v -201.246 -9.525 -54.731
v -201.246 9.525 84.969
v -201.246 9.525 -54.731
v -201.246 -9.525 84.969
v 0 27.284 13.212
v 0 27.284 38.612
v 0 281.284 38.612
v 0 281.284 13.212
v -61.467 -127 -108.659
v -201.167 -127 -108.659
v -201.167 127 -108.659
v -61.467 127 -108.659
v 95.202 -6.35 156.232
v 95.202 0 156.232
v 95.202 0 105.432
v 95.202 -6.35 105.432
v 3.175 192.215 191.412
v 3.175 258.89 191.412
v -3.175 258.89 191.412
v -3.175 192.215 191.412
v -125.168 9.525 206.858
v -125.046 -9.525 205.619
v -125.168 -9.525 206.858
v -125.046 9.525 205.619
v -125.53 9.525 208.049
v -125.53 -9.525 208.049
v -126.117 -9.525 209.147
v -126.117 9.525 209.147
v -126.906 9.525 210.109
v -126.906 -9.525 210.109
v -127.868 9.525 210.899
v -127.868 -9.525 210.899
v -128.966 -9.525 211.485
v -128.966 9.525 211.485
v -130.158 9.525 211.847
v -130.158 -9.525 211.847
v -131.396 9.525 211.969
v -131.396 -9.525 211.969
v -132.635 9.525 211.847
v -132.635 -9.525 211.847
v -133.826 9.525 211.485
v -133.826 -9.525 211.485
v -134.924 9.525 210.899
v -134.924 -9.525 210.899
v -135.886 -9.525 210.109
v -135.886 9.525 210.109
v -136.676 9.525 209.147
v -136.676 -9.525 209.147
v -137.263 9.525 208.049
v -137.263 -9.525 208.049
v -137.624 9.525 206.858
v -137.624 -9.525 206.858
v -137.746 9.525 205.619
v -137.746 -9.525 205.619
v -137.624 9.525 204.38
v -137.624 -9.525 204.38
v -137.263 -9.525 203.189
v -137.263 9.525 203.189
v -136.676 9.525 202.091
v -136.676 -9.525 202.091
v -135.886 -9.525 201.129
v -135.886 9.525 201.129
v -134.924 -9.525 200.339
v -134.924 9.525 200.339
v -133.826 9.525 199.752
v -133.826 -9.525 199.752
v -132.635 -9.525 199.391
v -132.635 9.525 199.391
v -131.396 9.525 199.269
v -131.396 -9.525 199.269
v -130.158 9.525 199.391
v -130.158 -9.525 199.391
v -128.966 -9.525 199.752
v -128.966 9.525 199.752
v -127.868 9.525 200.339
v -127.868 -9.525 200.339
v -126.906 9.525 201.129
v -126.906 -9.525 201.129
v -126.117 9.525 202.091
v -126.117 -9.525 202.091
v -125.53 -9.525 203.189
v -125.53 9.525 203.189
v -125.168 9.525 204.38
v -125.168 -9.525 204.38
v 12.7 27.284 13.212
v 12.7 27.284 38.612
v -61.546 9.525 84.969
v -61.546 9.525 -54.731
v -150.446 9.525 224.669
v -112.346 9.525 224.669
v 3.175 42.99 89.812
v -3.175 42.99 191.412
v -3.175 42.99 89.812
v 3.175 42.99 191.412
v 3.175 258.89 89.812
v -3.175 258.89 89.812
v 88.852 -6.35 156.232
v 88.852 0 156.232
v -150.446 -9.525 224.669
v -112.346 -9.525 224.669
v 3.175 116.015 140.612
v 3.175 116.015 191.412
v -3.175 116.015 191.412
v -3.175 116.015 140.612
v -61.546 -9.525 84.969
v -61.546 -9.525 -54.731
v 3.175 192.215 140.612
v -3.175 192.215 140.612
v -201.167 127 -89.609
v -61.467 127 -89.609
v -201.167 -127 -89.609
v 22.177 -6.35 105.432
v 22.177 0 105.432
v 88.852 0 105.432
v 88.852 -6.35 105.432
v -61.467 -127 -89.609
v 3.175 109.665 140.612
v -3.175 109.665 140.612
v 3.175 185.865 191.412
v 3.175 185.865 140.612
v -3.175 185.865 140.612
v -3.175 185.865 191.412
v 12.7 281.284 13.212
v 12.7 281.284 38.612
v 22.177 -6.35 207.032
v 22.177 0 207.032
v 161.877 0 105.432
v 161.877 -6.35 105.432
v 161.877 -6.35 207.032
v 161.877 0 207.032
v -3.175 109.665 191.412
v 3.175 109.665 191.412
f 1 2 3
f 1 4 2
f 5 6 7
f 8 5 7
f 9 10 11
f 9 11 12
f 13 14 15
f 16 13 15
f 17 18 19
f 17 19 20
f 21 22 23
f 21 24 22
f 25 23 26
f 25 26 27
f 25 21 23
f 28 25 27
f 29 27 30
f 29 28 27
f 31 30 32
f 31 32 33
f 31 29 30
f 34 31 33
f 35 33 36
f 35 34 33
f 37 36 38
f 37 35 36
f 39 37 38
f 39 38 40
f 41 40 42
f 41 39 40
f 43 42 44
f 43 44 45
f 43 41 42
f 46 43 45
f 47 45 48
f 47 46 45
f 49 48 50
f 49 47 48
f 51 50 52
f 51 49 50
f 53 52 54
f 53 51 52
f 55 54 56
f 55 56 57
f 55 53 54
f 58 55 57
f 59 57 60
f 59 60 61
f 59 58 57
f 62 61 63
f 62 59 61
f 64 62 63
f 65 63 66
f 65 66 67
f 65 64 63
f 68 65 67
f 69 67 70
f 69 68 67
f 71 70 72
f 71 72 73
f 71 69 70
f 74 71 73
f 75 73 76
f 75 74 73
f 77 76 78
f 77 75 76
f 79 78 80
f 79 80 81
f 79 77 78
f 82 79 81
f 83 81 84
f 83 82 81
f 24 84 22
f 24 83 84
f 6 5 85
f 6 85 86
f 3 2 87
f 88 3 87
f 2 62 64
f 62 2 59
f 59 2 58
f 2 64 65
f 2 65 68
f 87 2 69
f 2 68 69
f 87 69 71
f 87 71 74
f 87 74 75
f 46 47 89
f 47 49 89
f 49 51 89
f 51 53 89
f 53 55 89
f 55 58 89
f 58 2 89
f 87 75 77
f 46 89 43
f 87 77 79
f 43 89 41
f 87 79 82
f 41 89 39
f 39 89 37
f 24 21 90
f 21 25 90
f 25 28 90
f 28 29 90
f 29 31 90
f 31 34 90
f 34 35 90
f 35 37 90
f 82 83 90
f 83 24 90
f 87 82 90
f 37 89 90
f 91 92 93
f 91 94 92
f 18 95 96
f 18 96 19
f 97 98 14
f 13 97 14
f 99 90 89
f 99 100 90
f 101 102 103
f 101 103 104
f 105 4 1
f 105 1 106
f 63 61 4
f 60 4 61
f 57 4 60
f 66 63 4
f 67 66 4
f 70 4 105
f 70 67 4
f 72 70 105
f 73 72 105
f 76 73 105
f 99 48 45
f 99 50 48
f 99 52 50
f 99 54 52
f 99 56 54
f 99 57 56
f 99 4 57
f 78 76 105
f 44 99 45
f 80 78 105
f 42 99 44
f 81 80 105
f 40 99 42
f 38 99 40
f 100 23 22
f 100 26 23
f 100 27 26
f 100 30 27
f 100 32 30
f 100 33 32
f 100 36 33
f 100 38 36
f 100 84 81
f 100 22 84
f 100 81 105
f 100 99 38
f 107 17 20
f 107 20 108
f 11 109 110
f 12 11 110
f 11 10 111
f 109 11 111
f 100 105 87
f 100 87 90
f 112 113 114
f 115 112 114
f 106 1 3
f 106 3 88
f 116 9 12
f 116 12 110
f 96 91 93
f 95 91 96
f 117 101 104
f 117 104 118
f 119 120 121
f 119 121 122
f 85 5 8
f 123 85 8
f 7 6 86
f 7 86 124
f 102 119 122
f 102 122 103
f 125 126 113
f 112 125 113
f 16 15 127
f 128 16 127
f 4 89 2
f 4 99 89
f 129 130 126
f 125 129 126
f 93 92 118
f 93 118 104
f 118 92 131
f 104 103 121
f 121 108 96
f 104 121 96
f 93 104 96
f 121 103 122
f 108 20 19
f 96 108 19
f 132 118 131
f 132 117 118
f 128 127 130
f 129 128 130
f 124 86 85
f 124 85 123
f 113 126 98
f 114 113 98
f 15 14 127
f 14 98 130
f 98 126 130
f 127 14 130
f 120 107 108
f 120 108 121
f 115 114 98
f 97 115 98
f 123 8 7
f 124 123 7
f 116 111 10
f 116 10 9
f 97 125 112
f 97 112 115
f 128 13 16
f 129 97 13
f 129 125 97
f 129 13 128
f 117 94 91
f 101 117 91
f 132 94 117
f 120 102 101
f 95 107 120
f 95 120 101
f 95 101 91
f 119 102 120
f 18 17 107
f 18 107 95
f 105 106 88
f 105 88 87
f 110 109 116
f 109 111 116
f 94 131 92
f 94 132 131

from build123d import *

# Parameters (mm, degrees)
F2_W     = 254
F2_H     = 25.4
F3_DEPTH = 12.7
F1_R     = 6.35
F4_DEPTH = 9.525
F0_W     = 139.7
F0_H     = 19.05
F5_DEPTH = 127
F7_DEPTH = 3.175
F9_DEPTH = 6.35


with BuildPart() as f3:
    # F2 (on Right) → F3 (new body)
    with BuildSketch(Plane.YZ):
        with Locations((154.283948, 25.912475)):
            Rectangle(F2_W, F2_H)
    extrude(amount=F3_DEPTH)


with BuildPart() as f4:
    # F1 (on Front) → F4 (new body, symmetric)
    with BuildSketch(Plane.XZ):
        Polygon((-201.246336, 84.968814), (-201.246336, -54.731186), (-61.546336, -54.731186), (-61.546336, 84.968814), (-112.346336, 224.668814), (-150.446336, 224.668814), align=None)
        with Locations((-131.396336, 205.618814)):
            Circle(F1_R, mode=Mode.SUBTRACT)
    extrude(amount=F4_DEPTH, both=True)


with BuildPart() as f5:
    # F0 (on Front) → F5 (new body, symmetric)
    with BuildSketch(Plane.XZ):
        with Locations((-131.317047, -99.13432)):
            Rectangle(F0_W, F0_H)
    extrude(amount=F5_DEPTH, both=True)


with BuildPart() as f7:
    # F6 (on Right) → F7 (new body, symmetric)
    with BuildSketch(Plane.YZ):
        Polygon((42.990074, 191.412407), (42.990074, 89.812407), (258.890074, 89.812407), (258.890074, 191.412407), (192.215074, 191.412407), (192.215074, 140.612407), (185.865074, 140.612407), (185.865074, 191.412407), (116.015074, 191.412407), (116.015074, 140.612407), (109.665074, 140.612407), (109.665074, 191.412407), align=None)
    extrude(amount=F7_DEPTH, both=True)


with BuildPart() as f9:
    # F8 (on Front) → F9 (new body)
    with BuildSketch(Plane.XZ):
        Polygon((161.877349, 105.431862), (161.877349, 207.031862), (22.177349, 207.031862), (22.177349, 105.431862), (88.852349, 105.431862), (88.852349, 156.231862), (95.202349, 156.231862), (95.202349, 105.431862), align=None)
    extrude(amount=F9_DEPTH)


solid = Compound([f3.part, f4.part, f5.part, f7.part, f9.part])
